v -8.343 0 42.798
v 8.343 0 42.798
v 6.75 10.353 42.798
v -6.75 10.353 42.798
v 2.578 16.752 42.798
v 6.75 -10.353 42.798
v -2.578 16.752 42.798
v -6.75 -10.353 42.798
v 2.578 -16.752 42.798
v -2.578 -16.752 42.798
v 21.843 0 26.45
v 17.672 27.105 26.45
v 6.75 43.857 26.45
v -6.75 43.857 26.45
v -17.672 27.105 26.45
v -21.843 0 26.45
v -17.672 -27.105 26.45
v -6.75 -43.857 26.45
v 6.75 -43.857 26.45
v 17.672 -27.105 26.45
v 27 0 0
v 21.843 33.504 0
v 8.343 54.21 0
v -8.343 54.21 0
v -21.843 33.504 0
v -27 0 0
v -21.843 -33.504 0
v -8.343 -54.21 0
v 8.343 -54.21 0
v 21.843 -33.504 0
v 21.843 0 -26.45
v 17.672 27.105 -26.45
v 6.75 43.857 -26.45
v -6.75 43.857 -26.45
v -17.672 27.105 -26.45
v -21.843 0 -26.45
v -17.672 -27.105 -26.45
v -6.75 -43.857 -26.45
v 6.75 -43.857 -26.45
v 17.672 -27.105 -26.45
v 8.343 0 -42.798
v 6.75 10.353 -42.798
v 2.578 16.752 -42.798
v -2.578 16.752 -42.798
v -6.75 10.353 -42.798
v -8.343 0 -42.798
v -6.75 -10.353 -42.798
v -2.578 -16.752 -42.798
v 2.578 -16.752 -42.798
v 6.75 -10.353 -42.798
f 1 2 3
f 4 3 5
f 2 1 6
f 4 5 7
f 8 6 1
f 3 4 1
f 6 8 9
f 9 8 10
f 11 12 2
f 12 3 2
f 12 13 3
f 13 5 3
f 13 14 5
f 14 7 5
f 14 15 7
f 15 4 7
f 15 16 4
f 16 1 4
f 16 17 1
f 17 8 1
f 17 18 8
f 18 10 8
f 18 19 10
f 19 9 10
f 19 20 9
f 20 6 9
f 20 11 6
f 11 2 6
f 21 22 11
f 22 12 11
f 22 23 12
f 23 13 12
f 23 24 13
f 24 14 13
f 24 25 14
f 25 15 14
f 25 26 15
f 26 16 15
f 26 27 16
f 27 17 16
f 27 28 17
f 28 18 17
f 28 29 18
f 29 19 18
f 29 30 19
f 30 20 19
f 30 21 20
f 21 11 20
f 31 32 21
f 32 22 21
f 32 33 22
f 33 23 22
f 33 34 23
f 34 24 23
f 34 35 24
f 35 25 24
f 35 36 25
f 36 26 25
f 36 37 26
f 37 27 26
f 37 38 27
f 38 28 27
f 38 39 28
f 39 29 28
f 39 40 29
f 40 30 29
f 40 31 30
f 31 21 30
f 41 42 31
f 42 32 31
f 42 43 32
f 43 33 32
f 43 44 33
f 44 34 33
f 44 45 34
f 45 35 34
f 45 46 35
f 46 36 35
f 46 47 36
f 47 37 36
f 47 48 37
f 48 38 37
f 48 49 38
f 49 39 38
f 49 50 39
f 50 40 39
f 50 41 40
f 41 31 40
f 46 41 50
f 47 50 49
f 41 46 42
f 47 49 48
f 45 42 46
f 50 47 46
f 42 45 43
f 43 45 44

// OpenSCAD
// Generated by SolidPython 1.0.1 on 2020-07-29 00:46:49


scale(v = [9, 19, 15]) {
	sphere(r = 3);
}
/***********************************************
*********      SolidPython code:      **********
************************************************
 
# import packages: SolidPython
from solid import *
from solid.utils import *
from itertools import chain, combinations, permutations


class Resize:

    def __init__(self, scad_file):
        self.scad_file = scad_file
        #self.scad_file = import_scad(scad_file)
        # cone/cylinder param:
        self.r1 = 0
        self.r2 = 0
        self.h = 0
        # rectangular prism param:
        self.w = 0
        self.l = 0
        # ellipse param:
        self.r = 0

    # import OpenScad code (file name corresponds to shape)


    # classify shape + parameters
    def assign(self, param1, param2, param3):
        if self.scad_file == 'cone.scad':
            self.r1 = param1
            self.r2 = param2
            self.h = param3
        elif self.scad_file == 'cylinder.scad':
            self.r1 = param1
            self.r2 = param2
            self.h = param3
        elif self.scad_file == 'rectangularPrism.scad':
            self.h = param1
            self.l = param2
            self.w = param3
        else:
            self.r = param1
            self.h = param2

    # resize parameters
    def iterate(self):
        x = range(3, 20, 2)
        i = 1
        if self.scad_file == 'cone.scad':
            tempList = list(permutations(x, 2))
            for temp in tempList:
                param1 = temp[0]
                param2 = temp[1]
                filepath = 'produced_scad_files/' + 'cone' + str(param1) + '_' + str(param2) + '_' + '.scad'
                scad_render_to_file(cylinder(h=param1, r1=param2, r2=0), filepath)

        elif self.scad_file == 'cylinder.scad':
            tempList = list(permutations(x, 3))
            for temp in tempList:
                param1 = temp[0]
                param2 = temp[1]
                filepath = 'produced_scad_files/' + 'cylinder' + str(param1) + '_' + str(param2) + '_' + '.scad'
                scad_render_to_file(cylinder(h=param1, r1=param2, r2=param2), filepath)

        elif self.scad_file == 'rectangularPrism.scad':
            tempList = list(permutations(x, 3))
            for temp in tempList:
                param1 = temp[0]
                param2 = temp[1]
                param3 = temp[2]
                filepath = 'produced_scad_files/' + 'rectangularPrism' + str(param1) + '_' + str(param2) + '_' + str(
                    param3) + '.scad'
                scad_render_to_file(cube(size=(param1, param2, param3)), filepath)

        elif self.scad_file == 'ellipse.scad':
            tempList = list(permutations(x, 4))
            for temp in tempList:
                param1 = temp[0]
                param2 = temp[1]
                param3 = temp[2]
                param4 = temp[3]
                filepath = 'produced_scad_files/' + 'ellipse' + str(param1) + '_' + str(param2) + '_' + str(param3) + '_' + str(param4) + '.scad'
                scad_render_to_file(scale([param1, param2, param3])(sphere(r=param4)), filepath)

    def render_to_scadfile(self):
        scad_render_to_file(scad, 'example.scad') 
 
************************************************/
